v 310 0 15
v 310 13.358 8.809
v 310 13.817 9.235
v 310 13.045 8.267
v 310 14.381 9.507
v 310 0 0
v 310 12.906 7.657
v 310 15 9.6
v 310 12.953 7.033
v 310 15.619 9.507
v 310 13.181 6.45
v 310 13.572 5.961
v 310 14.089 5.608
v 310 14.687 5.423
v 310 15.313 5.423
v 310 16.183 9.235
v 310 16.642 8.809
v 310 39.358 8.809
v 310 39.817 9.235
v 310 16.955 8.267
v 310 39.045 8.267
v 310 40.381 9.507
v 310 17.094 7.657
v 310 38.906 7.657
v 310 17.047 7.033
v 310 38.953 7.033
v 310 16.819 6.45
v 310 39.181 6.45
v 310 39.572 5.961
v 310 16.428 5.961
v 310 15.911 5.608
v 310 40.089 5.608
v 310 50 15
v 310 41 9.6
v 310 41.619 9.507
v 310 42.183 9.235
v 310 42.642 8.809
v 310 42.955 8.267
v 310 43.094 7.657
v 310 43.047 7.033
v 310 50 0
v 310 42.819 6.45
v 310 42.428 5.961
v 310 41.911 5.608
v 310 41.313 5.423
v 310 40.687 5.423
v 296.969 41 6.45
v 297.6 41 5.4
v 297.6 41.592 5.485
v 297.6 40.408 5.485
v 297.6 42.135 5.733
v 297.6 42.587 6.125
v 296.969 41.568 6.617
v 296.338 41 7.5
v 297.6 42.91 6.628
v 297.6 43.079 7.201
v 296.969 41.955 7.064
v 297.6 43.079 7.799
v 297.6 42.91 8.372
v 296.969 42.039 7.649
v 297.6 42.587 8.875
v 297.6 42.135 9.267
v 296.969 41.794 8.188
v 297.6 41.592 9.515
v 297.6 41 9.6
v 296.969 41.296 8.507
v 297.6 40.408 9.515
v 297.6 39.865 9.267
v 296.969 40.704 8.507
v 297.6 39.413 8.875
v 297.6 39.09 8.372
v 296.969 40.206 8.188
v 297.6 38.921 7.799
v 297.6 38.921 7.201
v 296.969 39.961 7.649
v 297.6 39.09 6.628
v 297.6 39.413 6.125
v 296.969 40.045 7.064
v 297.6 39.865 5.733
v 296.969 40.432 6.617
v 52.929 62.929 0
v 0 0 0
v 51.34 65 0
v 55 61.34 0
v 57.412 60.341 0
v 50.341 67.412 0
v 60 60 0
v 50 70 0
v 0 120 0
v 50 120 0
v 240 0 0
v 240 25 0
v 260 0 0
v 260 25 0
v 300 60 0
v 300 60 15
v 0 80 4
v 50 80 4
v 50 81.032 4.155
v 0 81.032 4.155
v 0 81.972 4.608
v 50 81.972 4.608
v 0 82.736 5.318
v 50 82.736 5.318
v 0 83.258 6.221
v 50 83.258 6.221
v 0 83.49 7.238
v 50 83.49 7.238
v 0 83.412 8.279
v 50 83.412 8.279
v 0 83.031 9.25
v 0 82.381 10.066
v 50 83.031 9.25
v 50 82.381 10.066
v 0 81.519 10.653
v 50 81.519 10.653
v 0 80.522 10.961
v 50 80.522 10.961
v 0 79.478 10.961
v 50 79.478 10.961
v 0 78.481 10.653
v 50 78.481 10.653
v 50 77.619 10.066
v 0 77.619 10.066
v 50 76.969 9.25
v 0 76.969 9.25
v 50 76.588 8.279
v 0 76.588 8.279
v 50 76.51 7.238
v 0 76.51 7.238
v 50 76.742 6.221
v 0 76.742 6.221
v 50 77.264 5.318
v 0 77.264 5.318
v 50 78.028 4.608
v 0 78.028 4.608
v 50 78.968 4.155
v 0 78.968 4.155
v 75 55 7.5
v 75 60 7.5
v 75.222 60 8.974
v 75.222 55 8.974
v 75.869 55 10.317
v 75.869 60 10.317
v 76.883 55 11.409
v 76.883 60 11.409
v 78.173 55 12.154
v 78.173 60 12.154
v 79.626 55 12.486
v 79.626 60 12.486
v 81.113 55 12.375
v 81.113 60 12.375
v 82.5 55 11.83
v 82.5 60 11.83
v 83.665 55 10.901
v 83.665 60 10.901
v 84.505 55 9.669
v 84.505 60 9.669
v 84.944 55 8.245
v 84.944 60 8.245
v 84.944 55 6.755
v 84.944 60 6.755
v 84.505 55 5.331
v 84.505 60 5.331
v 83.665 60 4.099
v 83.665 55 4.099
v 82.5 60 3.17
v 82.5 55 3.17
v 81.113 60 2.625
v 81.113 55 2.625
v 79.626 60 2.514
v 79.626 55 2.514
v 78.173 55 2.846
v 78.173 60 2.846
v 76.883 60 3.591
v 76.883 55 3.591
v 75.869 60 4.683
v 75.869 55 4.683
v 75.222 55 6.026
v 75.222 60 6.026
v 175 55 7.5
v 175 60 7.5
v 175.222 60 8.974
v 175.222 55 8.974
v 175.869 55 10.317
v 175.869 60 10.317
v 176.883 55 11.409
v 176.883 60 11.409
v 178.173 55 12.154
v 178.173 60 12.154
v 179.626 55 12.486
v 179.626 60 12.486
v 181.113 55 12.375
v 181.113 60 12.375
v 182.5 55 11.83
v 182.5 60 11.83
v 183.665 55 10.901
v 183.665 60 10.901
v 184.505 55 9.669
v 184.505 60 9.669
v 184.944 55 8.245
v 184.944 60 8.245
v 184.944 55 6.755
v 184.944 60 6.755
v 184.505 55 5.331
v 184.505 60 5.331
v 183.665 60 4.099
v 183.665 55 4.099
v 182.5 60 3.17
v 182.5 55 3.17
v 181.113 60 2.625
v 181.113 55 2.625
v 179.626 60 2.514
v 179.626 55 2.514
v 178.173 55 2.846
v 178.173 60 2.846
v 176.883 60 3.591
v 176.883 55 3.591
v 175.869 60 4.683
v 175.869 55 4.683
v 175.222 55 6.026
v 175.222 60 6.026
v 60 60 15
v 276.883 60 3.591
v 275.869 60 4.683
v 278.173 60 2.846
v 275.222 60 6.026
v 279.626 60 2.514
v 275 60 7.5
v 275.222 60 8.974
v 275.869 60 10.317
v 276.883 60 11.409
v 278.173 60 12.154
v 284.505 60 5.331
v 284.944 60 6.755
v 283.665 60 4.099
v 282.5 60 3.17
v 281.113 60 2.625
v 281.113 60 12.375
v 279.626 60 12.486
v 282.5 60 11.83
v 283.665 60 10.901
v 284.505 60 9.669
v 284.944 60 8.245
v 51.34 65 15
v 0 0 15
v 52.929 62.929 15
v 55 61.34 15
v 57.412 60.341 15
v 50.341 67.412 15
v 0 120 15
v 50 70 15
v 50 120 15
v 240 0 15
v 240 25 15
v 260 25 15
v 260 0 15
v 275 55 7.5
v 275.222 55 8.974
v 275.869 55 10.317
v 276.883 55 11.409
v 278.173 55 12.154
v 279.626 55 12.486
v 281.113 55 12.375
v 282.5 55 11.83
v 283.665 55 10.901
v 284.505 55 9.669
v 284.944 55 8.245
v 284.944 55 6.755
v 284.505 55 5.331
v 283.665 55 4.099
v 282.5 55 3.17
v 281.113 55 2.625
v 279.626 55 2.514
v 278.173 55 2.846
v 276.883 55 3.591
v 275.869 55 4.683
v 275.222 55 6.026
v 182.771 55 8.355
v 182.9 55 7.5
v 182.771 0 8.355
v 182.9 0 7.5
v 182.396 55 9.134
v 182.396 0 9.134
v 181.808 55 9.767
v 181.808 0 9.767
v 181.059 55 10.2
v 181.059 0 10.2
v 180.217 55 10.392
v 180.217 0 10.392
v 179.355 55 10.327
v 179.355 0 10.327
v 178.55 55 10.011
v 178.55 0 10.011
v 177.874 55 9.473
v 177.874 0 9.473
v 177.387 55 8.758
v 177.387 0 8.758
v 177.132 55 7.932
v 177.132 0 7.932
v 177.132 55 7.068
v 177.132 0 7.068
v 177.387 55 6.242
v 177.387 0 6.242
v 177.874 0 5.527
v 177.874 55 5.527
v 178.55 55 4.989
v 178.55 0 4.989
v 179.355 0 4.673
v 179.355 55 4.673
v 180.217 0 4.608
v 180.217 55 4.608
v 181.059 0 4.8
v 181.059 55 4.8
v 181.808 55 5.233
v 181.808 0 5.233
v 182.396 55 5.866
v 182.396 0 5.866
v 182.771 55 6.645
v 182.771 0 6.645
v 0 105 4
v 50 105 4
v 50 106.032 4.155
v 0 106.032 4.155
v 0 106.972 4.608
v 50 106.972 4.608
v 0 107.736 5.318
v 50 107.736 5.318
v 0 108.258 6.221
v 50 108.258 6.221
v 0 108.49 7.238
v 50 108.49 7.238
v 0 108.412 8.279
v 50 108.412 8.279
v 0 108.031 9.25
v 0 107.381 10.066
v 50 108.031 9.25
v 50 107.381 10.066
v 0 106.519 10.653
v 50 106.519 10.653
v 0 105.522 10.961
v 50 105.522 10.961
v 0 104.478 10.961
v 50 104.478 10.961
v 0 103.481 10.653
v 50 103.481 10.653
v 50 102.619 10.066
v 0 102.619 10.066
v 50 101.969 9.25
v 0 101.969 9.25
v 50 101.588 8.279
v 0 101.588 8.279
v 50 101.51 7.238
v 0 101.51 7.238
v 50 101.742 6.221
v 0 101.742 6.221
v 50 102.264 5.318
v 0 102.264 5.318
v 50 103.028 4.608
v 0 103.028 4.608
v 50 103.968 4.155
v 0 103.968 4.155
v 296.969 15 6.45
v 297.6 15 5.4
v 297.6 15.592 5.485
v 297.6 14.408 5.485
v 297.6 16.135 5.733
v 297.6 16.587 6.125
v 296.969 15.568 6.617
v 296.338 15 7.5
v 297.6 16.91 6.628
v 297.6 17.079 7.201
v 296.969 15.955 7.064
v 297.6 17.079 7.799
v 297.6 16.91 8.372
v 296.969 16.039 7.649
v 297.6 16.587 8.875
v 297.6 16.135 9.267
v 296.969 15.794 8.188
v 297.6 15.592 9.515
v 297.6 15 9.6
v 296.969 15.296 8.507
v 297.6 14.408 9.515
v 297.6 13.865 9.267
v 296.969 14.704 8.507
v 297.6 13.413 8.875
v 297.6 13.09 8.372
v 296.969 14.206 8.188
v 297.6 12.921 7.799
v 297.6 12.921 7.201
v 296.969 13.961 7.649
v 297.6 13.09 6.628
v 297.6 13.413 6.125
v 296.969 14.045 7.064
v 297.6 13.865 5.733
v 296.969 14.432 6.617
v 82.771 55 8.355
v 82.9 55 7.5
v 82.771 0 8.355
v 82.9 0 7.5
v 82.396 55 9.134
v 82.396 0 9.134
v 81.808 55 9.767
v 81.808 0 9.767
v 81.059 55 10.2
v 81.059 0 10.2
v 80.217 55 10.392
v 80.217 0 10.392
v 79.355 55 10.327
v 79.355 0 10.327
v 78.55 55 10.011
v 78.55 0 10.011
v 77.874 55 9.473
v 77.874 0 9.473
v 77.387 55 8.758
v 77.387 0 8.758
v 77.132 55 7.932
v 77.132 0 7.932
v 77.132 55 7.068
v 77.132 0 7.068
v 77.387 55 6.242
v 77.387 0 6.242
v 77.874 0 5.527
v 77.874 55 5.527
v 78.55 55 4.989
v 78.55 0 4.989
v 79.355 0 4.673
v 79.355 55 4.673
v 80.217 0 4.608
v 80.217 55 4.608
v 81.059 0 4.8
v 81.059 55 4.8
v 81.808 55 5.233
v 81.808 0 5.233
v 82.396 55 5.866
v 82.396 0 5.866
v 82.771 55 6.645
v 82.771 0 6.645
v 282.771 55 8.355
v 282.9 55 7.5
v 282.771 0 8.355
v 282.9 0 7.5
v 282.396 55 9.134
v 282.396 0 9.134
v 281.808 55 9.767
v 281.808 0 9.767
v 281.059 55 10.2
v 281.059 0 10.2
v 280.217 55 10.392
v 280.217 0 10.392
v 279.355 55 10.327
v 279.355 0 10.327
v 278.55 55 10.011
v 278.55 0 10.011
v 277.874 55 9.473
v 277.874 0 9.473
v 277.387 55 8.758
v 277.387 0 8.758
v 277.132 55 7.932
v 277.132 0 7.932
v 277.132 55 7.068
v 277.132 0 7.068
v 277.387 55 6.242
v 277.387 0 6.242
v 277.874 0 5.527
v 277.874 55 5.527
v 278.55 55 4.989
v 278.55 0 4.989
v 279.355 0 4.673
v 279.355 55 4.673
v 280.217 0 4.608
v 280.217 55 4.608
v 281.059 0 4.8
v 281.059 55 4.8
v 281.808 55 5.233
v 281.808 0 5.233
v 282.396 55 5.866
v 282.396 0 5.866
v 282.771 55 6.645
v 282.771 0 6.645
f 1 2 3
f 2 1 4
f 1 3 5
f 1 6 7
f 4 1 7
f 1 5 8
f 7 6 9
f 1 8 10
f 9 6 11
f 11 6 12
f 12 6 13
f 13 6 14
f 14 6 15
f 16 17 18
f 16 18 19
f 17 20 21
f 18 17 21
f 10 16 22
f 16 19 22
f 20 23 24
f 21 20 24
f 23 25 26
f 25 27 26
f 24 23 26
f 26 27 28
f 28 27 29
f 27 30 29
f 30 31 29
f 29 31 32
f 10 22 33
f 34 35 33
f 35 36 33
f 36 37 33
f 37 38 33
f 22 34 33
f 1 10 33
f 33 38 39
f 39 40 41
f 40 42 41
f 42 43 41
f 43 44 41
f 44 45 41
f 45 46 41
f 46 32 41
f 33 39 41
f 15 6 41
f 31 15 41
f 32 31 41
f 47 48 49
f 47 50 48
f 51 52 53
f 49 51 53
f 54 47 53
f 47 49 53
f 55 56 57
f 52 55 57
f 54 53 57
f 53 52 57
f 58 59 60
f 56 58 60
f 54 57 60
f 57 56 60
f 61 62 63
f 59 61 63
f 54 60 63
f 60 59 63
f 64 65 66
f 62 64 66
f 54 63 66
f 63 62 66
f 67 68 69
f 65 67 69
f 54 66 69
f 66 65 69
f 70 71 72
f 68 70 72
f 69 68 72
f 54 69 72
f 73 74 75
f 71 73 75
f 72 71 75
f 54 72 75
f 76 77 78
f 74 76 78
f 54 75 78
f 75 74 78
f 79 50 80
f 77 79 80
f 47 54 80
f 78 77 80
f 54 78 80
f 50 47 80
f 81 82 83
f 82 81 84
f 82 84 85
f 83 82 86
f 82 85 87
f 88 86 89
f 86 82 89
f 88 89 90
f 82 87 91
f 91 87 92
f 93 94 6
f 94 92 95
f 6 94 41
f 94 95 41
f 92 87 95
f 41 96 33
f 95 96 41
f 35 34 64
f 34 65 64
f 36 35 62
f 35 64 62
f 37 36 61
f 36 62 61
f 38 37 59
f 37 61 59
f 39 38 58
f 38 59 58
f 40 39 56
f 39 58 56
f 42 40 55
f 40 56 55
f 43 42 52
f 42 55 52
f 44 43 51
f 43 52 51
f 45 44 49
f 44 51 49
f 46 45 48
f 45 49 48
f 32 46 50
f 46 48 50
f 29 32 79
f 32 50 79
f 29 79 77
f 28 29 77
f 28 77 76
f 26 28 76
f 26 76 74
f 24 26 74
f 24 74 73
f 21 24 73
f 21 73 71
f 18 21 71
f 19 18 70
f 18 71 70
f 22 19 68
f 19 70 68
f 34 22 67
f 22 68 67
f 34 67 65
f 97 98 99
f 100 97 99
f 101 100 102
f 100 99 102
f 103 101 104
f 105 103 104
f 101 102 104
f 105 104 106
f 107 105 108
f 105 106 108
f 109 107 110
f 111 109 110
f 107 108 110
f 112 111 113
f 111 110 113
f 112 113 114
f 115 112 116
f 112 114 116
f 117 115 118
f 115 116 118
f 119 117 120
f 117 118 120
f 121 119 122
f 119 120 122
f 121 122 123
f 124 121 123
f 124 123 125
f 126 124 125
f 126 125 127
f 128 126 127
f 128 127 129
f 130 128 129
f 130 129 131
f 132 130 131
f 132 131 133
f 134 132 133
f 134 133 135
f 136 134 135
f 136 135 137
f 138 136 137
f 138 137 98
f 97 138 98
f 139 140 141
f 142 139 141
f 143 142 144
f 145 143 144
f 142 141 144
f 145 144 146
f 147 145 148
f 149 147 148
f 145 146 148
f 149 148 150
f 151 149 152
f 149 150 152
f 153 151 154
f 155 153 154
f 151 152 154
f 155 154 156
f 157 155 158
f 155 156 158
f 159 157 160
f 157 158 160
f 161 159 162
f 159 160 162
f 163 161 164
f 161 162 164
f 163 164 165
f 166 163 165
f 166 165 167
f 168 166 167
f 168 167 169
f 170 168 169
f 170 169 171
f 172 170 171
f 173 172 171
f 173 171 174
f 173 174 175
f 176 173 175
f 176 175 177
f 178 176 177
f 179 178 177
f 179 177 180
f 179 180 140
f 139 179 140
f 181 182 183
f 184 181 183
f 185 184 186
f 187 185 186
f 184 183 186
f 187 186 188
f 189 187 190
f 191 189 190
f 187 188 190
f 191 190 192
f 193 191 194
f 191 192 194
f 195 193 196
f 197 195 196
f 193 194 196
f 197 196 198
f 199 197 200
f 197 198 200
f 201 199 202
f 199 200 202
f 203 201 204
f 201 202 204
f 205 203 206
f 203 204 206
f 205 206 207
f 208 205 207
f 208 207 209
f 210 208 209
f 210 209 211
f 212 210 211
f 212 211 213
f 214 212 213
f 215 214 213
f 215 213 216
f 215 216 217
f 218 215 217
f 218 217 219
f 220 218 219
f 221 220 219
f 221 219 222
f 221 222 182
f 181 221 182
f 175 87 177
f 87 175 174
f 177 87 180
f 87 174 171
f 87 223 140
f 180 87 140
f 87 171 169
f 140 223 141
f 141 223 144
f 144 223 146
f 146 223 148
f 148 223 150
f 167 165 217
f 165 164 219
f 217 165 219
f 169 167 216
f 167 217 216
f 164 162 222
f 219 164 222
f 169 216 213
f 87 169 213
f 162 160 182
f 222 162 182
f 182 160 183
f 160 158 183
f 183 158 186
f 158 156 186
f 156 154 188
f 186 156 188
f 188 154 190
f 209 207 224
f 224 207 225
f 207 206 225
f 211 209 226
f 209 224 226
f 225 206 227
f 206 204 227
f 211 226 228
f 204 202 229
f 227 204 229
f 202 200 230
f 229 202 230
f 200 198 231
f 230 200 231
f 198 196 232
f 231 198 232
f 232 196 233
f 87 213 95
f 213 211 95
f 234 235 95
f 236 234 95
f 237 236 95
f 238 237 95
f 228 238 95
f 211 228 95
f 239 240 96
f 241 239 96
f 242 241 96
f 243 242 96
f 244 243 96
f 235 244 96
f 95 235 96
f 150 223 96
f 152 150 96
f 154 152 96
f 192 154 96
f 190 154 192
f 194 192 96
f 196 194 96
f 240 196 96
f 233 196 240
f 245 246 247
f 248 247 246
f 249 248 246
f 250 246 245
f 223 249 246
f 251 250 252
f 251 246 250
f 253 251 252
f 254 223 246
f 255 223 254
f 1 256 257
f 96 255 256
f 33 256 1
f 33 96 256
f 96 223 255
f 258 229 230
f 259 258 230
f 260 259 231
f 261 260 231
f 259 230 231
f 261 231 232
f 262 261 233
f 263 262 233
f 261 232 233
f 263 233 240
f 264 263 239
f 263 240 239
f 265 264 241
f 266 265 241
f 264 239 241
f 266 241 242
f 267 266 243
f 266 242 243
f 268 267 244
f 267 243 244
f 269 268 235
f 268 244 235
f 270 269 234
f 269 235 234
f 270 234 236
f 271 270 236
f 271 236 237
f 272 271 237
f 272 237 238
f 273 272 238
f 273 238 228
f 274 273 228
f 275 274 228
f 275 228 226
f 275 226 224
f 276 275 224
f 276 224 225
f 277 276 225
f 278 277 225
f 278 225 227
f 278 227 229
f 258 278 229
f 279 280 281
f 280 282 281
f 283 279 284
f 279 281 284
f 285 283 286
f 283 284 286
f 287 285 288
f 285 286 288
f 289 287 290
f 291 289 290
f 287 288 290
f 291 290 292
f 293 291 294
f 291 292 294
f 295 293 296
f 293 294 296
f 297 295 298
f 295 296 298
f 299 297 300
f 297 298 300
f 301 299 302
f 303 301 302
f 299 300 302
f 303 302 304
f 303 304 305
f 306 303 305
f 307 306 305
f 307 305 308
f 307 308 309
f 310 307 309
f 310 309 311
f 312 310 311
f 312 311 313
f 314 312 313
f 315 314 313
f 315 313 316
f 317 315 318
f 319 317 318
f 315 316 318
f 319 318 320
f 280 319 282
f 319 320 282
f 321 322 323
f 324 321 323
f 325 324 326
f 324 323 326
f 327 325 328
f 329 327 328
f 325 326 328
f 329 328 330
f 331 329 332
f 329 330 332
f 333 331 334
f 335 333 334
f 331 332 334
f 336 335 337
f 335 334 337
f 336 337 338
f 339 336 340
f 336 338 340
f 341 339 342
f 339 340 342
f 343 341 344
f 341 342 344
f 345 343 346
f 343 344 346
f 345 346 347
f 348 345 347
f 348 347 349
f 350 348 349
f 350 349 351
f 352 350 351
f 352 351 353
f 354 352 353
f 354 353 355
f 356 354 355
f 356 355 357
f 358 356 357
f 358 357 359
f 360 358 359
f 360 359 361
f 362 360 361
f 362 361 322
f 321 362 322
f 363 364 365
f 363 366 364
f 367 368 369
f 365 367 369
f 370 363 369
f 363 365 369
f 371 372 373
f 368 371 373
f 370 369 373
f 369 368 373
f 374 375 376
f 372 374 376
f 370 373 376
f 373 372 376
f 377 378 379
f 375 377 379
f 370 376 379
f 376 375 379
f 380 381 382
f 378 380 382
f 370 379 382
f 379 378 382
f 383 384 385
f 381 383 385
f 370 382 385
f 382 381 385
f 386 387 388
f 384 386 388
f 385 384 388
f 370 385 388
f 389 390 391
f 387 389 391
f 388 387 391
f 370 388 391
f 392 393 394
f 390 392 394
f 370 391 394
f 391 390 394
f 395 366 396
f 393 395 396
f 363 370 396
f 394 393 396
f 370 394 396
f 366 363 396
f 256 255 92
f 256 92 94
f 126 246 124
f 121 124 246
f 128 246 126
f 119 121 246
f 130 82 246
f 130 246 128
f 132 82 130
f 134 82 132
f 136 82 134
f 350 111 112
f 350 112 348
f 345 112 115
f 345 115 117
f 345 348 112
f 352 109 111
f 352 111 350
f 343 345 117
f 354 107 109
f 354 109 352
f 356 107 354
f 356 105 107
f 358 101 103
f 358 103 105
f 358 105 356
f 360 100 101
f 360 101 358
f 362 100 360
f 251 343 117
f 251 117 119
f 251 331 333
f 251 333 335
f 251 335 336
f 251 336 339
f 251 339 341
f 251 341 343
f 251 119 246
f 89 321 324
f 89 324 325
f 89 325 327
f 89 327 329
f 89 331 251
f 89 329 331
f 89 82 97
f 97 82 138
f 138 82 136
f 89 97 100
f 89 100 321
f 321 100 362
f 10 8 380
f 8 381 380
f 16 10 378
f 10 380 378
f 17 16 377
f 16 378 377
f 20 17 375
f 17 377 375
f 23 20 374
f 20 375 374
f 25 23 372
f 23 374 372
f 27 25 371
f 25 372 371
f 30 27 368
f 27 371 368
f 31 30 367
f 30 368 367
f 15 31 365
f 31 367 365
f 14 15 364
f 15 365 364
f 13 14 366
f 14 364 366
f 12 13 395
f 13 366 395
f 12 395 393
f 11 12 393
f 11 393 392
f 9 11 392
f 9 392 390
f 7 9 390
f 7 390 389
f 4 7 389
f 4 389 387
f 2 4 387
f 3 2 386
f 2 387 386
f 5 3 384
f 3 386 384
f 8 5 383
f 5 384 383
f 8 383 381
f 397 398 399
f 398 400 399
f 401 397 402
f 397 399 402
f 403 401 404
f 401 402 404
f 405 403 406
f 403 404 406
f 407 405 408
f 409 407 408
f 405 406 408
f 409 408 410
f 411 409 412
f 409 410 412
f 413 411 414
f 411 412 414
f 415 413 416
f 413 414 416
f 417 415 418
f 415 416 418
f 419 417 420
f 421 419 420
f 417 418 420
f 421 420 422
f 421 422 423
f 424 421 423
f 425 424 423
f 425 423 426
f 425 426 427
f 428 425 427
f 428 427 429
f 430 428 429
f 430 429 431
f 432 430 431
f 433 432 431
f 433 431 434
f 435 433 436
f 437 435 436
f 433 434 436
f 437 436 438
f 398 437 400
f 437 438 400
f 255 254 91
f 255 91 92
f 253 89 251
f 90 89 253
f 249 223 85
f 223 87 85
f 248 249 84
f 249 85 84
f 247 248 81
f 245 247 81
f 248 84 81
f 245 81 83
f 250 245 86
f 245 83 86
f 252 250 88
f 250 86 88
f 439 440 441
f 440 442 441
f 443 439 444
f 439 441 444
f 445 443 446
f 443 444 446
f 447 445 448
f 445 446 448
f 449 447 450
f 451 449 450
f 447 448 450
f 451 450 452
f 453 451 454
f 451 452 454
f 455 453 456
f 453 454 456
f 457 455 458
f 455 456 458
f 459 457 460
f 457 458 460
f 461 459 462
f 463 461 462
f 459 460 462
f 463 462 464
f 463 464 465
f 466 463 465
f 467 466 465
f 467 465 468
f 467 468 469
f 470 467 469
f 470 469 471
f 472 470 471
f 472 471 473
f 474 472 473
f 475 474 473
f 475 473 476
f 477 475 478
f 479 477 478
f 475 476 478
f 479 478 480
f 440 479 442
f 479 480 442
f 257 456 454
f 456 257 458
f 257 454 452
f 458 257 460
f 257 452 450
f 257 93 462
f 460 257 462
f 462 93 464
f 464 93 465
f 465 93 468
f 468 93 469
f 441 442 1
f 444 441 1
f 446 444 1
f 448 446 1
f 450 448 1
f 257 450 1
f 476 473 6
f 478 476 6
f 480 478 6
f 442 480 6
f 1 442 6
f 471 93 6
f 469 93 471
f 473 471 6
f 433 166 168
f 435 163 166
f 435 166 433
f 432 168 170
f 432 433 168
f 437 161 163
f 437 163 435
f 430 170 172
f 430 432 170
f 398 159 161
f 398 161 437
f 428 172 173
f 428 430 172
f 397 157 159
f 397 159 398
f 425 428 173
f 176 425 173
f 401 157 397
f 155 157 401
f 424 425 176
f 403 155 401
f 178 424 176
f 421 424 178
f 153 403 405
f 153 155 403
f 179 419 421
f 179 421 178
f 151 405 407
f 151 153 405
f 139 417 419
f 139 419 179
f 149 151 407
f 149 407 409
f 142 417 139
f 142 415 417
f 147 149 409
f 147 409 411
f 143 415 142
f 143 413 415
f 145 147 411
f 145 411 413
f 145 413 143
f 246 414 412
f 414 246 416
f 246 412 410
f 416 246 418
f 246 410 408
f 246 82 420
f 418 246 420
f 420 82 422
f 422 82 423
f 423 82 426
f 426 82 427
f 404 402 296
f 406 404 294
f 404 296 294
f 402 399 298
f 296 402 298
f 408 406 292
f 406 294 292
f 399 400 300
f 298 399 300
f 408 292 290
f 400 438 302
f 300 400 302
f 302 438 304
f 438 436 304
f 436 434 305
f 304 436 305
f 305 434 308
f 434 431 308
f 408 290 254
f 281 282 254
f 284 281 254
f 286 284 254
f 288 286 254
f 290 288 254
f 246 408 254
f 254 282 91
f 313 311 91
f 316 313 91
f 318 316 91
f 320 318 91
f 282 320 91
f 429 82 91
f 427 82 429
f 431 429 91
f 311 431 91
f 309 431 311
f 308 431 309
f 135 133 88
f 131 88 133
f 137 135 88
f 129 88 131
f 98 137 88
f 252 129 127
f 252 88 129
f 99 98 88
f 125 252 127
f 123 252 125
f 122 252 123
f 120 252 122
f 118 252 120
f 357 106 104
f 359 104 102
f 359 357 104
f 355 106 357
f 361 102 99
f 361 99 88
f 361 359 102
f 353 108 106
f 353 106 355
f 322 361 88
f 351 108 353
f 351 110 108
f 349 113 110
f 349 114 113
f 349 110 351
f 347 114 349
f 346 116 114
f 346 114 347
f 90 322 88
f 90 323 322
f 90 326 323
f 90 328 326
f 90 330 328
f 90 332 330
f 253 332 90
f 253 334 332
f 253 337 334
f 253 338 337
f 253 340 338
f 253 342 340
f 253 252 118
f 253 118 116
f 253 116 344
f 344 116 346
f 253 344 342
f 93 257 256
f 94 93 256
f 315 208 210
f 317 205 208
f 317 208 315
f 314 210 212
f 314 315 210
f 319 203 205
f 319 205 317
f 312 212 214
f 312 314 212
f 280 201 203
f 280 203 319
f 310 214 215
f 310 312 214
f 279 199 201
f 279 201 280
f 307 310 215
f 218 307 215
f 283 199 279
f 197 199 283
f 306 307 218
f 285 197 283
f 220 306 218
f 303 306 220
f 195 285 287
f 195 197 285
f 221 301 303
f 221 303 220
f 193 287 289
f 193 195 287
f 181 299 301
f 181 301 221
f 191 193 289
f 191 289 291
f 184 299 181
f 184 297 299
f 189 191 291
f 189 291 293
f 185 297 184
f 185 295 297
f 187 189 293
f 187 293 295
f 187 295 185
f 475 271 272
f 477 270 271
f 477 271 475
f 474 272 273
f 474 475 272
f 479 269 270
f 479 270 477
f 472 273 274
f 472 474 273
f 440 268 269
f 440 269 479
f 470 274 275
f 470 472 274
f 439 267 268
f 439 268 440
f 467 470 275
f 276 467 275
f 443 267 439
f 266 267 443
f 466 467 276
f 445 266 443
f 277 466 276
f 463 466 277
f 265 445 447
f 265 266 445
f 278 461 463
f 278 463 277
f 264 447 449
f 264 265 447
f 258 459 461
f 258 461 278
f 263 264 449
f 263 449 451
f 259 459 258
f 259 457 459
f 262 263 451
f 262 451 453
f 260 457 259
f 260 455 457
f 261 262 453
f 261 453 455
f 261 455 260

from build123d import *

# Parameters (mm, degrees)
SKETCH_1_W                   = 310
SKETCH_1_H                   = 120
EXTRUDE_1_DEPTH              = 15
SKETCH_2_W                   = 260
SKETCH_2_H                   = 60
CUT_EXTRUDE_1_DEPTH          = 333.753662639
HOLE_WIZARD_M5_1_D           = 5.8
HOLE_WIZARD_M5_1_CBORE_D     = 10
HOLE_WIZARD_M5_1_CBORE_DEPTH = 5
SKETCH_7_R                   = 3.5
CUT_EXTRUDE_2_DEPTH          = 287.749019179
CHAMFER_1_SIZE               = 10
FILLET_1_R                   = 10
HOLE_WIZARD_M5_1_2_D         = 4.2
HOLE_WIZARD_M5_1_2_DEPTH     = 12.4
HOLE_WIZARD_M5_1_2_TIP       = 1.2618073
SKETCH_10_W                  = 20
SKETCH_10_H                  = 25
CUT_EXTRUDE_3_DEPTH          = 333.753662639


with BuildPart() as part:
    # 草图1 → 凸台-拉伸1 (new body)
    with BuildSketch(Plane.XY):
        with Locations((155, 60)):
            Rectangle(SKETCH_1_W, SKETCH_1_H)
    extrude(amount=EXTRUDE_1_DEPTH)

    # 草图2 → 切除-拉伸1 (cut, through all)
    with BuildSketch(Plane.XY.offset(15)):
        with Locations((180, 90)):
            Rectangle(SKETCH_2_W, SKETCH_2_H)
    extrude(amount=-CUT_EXTRUDE_1_DEPTH, mode=Mode.SUBTRACT)

    # Hole Wizard M5 _1 (through all)
    with Locations(Plane(origin=(0, 60, 0), x_dir=(-1, 0, 0), z_dir=(0, 1, 0))):
        with Locations((-80, 7.5), (-280, 7.5), (-180, 7.5)):
            CounterBoreHole(HOLE_WIZARD_M5_1_D / 2, HOLE_WIZARD_M5_1_CBORE_D / 2, HOLE_WIZARD_M5_1_CBORE_DEPTH)

    # 草图7 → 切除-拉伸2 (cut, through all)
    with BuildSketch(Plane(origin=(50, 0, 0), x_dir=(0, 0, -1), z_dir=(1, 0, 0))):
        with Locations((-7.5, 80)):
            Circle(SKETCH_7_R)
        with Locations((-7.5, 105)):
            Circle(SKETCH_7_R)
    extrude(amount=-CUT_EXTRUDE_2_DEPTH, mode=Mode.SUBTRACT)

    # 倒角1
    chamfer_1_edges = [part.edges().sort_by_distance(p)[0] for p in [
        (310, 60, 7.5),
    ]]
    chamfer(chamfer_1_edges, length=CHAMFER_1_SIZE)

    # 圆角1
    fillet_1_edges = [part.edges().sort_by_distance(p)[0] for p in [
        (50, 60, 7.5),
    ]]
    fillet(fillet_1_edges, radius=FILLET_1_R)

    # Hole Wizard M5 _1 2
    with Locations(Plane(origin=(310, 0, 0), x_dir=(0, 0, -1), z_dir=(1, 0, 0))):
        with Locations((-7.5, 41), (-7.5, 15)):
            Hole(HOLE_WIZARD_M5_1_2_D / 2, depth=HOLE_WIZARD_M5_1_2_DEPTH)
            with Locations((0, 0, -(HOLE_WIZARD_M5_1_2_DEPTH + HOLE_WIZARD_M5_1_2_TIP / 2))):  # 118° drill point
                Cone(0, HOLE_WIZARD_M5_1_2_D / 2, HOLE_WIZARD_M5_1_2_TIP, mode=Mode.SUBTRACT)

    # 草图10 → 切除-拉伸3 (cut, through all)
    with BuildSketch(Plane.XY.offset(15)):
        with Locations((250, 12.5)):
            Rectangle(SKETCH_10_W, SKETCH_10_H)
    extrude(amount=-CUT_EXTRUDE_3_DEPTH, mode=Mode.SUBTRACT)


solid = part.part
